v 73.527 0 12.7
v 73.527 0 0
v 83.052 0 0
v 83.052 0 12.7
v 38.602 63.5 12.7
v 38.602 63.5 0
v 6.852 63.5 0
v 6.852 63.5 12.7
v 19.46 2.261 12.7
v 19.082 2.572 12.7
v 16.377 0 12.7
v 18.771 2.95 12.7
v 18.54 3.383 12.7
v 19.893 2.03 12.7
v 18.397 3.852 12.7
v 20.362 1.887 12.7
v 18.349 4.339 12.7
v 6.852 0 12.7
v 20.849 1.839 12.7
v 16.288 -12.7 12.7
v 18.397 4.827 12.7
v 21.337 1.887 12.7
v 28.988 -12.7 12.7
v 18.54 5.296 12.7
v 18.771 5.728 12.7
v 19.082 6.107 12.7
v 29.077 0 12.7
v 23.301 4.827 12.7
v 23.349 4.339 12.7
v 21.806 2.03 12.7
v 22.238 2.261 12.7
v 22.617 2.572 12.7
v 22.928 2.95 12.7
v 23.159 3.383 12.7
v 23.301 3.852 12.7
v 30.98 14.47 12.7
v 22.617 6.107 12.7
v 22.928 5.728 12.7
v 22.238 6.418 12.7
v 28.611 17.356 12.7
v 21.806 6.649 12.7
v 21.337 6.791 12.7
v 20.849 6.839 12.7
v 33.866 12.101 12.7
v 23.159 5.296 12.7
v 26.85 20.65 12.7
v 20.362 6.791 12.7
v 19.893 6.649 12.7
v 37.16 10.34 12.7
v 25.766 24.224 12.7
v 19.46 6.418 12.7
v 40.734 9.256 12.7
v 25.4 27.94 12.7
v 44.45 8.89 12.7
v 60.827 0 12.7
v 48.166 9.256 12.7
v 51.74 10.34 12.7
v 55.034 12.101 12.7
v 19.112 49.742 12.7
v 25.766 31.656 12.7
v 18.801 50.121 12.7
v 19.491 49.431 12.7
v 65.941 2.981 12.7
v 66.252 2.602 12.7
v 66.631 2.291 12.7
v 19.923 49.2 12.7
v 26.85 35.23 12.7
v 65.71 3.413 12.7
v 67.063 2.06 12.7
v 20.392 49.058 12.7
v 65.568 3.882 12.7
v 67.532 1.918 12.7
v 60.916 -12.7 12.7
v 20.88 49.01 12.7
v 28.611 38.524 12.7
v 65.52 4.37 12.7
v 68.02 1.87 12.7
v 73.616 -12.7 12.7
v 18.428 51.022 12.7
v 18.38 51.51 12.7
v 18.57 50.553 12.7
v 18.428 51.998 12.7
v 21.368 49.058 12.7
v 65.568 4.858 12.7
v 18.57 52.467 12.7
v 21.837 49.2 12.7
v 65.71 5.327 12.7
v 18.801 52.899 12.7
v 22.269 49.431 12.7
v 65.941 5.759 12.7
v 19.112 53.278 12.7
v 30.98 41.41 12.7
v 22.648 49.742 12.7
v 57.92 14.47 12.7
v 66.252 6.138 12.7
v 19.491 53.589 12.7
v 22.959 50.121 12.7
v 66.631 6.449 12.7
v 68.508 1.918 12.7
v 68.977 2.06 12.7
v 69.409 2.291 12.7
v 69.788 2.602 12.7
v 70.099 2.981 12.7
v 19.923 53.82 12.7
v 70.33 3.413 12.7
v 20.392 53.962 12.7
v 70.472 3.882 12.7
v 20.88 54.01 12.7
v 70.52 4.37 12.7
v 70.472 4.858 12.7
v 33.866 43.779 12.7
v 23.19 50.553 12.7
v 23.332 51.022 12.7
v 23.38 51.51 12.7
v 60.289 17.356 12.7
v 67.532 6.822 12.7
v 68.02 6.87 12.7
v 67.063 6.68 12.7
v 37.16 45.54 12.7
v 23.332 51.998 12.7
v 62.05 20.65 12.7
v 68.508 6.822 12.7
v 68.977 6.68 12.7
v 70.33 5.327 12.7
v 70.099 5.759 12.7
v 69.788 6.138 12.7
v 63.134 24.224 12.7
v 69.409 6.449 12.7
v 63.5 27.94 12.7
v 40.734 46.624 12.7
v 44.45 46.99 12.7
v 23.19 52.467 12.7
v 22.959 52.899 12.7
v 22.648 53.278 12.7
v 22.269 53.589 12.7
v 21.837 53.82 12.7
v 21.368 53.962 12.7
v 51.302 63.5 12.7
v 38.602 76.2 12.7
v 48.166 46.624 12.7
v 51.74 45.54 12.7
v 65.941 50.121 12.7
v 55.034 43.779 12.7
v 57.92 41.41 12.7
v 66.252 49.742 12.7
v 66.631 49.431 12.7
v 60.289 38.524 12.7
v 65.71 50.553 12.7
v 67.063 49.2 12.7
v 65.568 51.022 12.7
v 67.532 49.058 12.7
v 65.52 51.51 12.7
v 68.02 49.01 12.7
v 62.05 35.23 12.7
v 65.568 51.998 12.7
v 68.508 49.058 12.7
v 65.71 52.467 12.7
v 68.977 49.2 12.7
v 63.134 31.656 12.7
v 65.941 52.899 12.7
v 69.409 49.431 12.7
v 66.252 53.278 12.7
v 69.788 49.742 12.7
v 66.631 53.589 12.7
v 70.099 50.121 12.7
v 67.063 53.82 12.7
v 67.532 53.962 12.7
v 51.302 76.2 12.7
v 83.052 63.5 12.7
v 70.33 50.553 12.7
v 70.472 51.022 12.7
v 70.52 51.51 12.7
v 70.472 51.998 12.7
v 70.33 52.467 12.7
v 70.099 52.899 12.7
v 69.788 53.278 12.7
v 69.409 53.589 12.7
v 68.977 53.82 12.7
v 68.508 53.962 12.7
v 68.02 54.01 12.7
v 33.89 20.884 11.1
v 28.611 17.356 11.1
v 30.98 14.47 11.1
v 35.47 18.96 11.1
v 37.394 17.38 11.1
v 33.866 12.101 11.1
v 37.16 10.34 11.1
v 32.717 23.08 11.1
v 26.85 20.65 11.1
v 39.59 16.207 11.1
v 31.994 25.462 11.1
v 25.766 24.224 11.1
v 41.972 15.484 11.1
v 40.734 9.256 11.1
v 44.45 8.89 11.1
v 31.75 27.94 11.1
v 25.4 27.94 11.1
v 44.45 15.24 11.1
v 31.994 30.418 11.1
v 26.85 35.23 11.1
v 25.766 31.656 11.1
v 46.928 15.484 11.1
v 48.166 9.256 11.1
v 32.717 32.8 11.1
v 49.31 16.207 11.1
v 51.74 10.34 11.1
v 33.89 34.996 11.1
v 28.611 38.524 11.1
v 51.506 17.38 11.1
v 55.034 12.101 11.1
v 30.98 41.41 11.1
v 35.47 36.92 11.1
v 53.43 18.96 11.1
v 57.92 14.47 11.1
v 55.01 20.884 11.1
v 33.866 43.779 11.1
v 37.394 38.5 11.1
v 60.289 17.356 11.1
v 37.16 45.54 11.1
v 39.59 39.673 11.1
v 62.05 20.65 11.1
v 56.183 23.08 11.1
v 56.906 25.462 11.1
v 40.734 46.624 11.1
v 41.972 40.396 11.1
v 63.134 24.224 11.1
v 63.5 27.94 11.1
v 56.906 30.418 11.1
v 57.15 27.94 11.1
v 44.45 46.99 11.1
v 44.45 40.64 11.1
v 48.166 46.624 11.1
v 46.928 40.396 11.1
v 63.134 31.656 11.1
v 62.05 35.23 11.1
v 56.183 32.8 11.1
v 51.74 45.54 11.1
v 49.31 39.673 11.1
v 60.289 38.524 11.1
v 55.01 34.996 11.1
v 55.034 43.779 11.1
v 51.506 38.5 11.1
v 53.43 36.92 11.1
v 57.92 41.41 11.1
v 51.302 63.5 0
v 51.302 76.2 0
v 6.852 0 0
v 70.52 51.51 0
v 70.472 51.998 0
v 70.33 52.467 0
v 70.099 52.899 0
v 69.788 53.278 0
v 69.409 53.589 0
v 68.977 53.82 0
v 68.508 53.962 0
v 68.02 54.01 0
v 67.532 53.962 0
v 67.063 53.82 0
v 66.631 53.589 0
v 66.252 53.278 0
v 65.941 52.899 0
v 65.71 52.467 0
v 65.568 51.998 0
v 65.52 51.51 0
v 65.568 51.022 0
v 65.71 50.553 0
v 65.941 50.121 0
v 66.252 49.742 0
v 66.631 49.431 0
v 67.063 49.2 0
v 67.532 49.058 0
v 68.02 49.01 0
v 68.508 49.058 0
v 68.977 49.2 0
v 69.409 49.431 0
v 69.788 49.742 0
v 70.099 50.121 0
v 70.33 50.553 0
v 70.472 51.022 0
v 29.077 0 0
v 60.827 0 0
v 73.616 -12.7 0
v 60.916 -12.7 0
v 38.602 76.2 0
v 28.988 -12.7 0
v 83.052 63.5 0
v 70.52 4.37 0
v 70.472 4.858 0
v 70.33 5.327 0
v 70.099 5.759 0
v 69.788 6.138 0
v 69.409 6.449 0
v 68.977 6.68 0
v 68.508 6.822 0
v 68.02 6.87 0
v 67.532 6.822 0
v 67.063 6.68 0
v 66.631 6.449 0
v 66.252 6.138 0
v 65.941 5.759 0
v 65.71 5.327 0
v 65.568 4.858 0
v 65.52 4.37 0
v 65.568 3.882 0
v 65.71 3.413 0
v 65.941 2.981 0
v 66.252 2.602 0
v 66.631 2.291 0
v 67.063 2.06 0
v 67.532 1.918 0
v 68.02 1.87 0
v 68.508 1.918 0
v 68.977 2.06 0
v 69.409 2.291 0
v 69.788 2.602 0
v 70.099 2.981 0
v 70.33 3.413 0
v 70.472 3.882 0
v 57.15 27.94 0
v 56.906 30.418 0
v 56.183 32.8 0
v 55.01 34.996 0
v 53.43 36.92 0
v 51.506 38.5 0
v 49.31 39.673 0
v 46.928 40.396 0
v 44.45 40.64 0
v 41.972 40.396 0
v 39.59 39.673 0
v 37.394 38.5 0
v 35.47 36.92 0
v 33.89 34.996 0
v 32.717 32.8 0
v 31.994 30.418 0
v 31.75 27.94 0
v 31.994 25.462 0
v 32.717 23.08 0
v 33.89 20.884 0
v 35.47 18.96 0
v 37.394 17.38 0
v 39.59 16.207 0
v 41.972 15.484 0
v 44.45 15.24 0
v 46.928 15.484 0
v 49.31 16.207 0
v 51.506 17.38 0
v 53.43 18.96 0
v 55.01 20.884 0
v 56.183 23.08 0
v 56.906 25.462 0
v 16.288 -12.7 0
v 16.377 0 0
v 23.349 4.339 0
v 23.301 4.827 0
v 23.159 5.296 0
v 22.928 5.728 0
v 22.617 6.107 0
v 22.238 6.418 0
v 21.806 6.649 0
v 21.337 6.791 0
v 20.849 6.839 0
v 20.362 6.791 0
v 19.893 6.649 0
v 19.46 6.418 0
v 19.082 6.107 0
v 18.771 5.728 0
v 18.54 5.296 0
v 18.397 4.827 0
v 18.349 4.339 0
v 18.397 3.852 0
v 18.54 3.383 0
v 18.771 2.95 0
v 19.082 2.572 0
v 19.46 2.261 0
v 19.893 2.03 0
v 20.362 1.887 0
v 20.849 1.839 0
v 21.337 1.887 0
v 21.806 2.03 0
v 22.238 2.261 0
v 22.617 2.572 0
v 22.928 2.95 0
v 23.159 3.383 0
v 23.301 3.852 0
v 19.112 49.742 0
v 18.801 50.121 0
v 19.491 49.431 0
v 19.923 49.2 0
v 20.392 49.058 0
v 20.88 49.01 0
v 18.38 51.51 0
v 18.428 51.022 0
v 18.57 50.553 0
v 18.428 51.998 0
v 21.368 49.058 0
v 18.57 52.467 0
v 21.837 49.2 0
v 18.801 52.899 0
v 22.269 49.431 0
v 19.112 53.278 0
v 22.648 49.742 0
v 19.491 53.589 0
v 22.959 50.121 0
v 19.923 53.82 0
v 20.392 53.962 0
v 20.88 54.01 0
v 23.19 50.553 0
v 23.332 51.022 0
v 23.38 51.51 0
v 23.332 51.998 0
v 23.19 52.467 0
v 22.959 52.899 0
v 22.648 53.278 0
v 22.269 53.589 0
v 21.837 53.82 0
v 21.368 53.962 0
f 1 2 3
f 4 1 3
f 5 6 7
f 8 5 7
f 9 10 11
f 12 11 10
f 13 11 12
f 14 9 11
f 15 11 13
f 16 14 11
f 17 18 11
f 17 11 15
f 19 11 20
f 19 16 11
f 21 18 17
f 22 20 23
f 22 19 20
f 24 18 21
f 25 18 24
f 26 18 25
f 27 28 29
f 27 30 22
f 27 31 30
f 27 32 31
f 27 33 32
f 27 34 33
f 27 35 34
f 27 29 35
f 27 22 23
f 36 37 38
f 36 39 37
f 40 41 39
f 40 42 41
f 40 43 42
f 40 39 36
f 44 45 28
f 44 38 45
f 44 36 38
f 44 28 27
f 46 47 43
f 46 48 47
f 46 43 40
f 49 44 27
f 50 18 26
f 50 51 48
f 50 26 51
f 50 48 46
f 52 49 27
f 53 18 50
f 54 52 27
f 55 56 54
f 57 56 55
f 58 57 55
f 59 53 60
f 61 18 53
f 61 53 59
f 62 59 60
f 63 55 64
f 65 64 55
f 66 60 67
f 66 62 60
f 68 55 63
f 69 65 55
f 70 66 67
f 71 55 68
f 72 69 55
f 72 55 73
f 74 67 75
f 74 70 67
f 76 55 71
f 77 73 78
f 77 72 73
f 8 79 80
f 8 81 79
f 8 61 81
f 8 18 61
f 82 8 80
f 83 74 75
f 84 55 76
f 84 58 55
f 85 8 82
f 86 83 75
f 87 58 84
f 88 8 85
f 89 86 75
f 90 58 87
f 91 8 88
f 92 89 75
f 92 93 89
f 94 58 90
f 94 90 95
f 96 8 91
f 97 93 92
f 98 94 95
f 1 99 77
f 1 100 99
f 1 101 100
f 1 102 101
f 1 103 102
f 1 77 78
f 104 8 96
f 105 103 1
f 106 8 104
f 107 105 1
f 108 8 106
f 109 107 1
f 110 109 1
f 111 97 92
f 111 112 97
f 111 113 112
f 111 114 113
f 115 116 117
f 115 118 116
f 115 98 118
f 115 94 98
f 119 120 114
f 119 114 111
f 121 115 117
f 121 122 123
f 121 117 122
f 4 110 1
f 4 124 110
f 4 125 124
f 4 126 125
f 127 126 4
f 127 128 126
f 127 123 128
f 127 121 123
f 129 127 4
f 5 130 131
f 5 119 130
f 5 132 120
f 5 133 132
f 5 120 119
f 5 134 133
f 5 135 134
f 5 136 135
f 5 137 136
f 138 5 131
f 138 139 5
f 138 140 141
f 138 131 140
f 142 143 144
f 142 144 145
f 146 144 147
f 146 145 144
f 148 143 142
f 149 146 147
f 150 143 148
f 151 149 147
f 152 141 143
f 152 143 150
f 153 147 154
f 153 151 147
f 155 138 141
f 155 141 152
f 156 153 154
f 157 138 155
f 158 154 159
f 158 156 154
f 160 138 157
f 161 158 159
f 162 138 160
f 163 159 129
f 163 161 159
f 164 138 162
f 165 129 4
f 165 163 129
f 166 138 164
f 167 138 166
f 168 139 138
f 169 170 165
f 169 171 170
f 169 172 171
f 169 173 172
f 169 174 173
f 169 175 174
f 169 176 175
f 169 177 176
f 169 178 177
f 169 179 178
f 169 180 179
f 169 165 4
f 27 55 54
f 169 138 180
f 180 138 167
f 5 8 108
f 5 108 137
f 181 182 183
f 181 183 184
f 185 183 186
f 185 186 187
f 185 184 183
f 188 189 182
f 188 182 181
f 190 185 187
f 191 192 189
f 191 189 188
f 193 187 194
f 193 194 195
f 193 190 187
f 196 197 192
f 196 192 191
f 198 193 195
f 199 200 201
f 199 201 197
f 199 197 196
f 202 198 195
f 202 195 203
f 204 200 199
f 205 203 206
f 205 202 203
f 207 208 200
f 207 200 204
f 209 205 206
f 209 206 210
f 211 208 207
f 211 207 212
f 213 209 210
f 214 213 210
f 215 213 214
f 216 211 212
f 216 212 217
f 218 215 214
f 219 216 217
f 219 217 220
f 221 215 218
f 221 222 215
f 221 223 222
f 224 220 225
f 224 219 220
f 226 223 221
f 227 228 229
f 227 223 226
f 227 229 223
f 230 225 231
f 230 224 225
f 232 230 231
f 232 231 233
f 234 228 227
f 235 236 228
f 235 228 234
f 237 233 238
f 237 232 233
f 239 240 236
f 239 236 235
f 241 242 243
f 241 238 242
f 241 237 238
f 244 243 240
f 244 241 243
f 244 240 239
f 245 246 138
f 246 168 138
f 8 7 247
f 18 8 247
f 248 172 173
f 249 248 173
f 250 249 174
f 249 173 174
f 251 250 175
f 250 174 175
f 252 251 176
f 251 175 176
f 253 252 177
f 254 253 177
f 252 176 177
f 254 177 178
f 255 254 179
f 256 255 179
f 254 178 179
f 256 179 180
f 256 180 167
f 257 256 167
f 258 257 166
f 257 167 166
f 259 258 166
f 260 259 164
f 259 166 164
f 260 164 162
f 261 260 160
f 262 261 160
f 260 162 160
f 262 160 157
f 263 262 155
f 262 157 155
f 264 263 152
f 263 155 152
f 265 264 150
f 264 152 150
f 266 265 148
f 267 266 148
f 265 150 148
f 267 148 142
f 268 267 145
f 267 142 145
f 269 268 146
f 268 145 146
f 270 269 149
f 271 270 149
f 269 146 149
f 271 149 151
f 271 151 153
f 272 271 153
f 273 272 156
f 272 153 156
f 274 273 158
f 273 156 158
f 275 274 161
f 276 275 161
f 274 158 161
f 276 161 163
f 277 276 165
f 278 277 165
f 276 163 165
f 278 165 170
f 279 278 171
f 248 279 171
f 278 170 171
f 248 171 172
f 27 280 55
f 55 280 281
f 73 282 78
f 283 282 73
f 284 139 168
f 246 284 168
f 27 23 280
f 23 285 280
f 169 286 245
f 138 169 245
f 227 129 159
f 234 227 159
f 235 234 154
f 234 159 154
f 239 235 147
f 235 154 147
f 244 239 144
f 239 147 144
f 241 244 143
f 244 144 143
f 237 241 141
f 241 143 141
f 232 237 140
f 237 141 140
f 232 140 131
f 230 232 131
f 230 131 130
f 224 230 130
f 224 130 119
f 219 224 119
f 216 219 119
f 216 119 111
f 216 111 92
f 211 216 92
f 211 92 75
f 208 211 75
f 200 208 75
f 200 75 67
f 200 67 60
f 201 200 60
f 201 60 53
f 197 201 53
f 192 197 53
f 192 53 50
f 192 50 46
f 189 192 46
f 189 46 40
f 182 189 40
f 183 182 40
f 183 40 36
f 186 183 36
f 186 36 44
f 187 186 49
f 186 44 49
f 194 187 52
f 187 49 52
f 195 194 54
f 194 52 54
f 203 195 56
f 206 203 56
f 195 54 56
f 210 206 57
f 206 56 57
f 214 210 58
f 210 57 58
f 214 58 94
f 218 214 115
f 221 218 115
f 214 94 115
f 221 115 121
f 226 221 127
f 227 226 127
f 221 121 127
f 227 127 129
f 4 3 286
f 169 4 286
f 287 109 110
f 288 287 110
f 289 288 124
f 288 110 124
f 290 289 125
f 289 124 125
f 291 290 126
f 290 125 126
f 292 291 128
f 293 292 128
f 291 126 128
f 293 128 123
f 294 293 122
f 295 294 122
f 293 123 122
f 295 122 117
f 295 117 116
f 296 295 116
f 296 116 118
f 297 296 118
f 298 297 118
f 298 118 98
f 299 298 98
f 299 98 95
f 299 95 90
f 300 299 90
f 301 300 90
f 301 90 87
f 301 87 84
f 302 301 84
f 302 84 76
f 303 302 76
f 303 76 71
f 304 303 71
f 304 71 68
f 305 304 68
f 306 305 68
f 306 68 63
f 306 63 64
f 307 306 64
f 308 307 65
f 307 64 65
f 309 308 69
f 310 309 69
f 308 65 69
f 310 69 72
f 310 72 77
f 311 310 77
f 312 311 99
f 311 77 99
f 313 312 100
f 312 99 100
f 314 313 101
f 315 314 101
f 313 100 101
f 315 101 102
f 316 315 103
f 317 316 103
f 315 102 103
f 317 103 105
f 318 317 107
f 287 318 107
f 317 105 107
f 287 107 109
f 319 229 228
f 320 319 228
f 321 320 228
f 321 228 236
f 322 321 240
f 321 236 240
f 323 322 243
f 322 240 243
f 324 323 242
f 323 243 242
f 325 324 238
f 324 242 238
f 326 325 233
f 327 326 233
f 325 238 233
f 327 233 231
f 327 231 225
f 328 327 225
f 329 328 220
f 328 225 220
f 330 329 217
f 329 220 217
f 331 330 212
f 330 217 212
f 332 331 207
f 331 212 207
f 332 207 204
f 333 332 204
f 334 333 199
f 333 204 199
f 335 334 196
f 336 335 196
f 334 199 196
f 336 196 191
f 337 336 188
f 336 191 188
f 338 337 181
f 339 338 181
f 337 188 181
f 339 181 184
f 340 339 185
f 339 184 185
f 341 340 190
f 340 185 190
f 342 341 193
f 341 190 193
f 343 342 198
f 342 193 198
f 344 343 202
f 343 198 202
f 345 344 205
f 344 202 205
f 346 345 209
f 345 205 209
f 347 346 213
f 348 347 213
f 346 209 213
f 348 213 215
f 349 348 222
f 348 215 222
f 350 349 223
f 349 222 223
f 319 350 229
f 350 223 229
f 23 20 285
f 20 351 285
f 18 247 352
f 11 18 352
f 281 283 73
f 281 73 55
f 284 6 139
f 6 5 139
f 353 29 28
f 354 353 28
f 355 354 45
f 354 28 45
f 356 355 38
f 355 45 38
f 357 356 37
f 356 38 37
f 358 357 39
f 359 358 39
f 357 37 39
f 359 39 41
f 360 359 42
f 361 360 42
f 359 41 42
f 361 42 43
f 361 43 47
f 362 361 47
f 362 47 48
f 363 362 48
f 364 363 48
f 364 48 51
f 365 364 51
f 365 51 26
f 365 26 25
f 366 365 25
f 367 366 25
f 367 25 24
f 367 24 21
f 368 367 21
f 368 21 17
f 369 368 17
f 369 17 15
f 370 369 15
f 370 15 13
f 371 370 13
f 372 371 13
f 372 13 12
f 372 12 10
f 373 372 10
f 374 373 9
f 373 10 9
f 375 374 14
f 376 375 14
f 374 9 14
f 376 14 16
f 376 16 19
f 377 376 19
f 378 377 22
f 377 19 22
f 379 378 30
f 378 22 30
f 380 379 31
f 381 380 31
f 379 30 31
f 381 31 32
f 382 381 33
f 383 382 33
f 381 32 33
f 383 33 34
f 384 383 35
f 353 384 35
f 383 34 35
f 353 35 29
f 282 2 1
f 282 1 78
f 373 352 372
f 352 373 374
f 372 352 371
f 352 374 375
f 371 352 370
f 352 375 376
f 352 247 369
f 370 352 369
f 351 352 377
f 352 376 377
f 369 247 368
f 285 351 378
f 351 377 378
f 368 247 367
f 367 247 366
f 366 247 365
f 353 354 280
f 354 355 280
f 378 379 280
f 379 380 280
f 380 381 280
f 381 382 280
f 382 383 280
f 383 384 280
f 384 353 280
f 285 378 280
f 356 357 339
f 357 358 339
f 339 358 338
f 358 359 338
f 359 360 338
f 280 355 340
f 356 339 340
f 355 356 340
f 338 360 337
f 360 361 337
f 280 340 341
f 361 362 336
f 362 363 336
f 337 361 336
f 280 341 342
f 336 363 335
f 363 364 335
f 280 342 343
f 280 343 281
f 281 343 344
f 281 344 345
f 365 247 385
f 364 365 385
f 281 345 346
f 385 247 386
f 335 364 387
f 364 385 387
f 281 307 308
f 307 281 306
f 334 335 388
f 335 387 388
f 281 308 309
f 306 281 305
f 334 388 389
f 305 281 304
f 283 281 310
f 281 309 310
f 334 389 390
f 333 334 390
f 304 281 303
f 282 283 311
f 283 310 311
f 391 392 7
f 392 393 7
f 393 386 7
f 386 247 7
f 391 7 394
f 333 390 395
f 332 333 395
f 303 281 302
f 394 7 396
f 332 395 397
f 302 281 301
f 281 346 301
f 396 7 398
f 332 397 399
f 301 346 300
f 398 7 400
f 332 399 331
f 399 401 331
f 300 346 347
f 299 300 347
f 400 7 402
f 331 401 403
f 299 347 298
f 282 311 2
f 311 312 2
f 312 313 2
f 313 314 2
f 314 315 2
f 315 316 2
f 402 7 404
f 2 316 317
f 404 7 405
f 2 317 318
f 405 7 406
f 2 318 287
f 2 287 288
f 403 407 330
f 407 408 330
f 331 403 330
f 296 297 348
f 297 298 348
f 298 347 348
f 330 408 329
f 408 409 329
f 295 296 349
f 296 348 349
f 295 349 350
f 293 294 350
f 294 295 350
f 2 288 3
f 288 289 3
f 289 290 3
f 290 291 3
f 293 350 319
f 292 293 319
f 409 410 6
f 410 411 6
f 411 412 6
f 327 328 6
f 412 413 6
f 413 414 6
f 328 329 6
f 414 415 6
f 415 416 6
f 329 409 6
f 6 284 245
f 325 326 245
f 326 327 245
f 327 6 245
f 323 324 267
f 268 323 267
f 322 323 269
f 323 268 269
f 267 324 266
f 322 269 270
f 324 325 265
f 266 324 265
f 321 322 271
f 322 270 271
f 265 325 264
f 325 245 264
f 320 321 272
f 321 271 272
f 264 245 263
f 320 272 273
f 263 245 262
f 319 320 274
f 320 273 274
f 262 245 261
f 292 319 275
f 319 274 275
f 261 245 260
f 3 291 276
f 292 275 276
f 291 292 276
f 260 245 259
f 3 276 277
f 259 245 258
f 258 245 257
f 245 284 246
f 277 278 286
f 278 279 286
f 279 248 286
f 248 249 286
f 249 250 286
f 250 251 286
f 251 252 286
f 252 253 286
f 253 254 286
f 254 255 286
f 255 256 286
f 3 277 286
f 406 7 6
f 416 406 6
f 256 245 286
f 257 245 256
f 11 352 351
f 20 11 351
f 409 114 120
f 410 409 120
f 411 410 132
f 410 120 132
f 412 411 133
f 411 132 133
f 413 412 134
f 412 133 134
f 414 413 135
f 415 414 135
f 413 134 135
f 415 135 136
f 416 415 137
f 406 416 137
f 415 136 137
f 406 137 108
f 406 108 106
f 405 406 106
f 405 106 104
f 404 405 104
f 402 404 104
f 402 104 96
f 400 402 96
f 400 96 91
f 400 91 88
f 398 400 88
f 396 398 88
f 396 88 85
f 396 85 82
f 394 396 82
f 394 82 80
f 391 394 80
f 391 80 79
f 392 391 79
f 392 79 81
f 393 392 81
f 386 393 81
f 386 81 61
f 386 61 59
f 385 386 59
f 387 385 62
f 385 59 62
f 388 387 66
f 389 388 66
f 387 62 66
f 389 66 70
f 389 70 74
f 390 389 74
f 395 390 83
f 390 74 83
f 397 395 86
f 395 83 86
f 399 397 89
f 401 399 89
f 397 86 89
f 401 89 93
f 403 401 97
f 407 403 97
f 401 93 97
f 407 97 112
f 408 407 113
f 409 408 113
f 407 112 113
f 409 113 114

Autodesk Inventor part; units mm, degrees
ref_plane "YZ Plane" through (0, 0, 0) normal (1, 0, 0) x (0, 1, 0)
ref_plane "XZ Plane" through (0, 0, 0) normal (0, 1, 0) x (-1, 0, 0)
ref_plane "XY Plane" through (0, 0, 0) normal (0, 0, 1) x (1, 0, 0)
sketch "Sketch1" plane through (0, 0, 0) normal (0, 0, 1) x (1, 0, 0)
  line L0 (6.8523, -0.0001) -> (16.3773, -0.0001)
  line L1 (83.0523, -0.0001) -> (83.0523, 63.4999)
  line L2 (83.0523, 63.4999) -> (6.8523, 63.4999)
  line L3 (6.8523, 63.4999) -> (6.8523, -0.0001)
  line L4 (44.9523, 0) -> (60.8273, 0) construction
  line L5 (44.9523, 0) -> (60.8273, 0) construction
  line L6 (73.5273, -0.0001) -> (73.6164, -12.6997)
  line L7 (73.6164, -12.6997) -> (60.9164, -12.7)
  line L8 (60.9164, -12.7) -> (60.8273, 0)
  line L9 (73.5273, -0.0001) -> (83.0523, -0.0001)
  line L10 (44.9523, 0) -> (44.9523, 63.4999) construction
  line L11 (44.9523, 0) -> (29.0773, 0) construction
  line L12 (44.9523, 0) -> (29.0773, 0) construction
  line L13 (16.3773, -0.0001) -> (16.2881, -12.6997)
  line L14 (16.2881, -12.6997) -> (28.9881, -12.7)
  line L15 (28.9881, -12.7) -> (29.0773, 0)
  line L16 (29.0773, 0) -> (60.8273, 0)
  dimension "d10" = 76.2
  dimension "d11" = 63.5
  dimension "d12" = 15.875
  dimension "d13" = 0
  dimension "d14" = 12.7
  dimension "d15" = 12.7
extrude "Extrusion1" add sketch "Sketch1" along normal blind 12.7
sketch "Sketch2" plane through (0, 0, 12.7) normal (0, 0, 1) x (1, 0, 0)
  line L0 (72.65, -0.26) -> (16.25, -0.26) construction
  line L1 (16.25, -0.26) -> (16.25, 56.14) construction
  line L2 (16.25, 56.14) -> (72.65, 56.14) construction
  line L3 (72.65, 56.14) -> (72.65, -0.26) construction
  line L4 (16.25, -0.26) -> (72.65, 56.14) construction
  line L5 (68.02, 4.37) -> (20.88, 4.37) construction
  line L6 (20.88, 4.37) -> (20.88, 51.51) construction
  line L7 (20.88, 51.51) -> (68.02, 51.51) construction
  line L8 (68.02, 51.51) -> (68.02, 4.37) construction
  line L9 (68.02, 4.37) -> (20.88, 51.51) construction
  line L10 (20.88, 4.37) -> (68.02, 51.51) construction
  circle A0 centre (20.8494, 4.3394) radius 2.5
  circle A1 centre (20.88, 51.51) radius 2.5
  circle A2 centre (68.02, 51.51) radius 2.5
  circle A3 centre (68.02, 4.37) radius 2.5
  line L11 (29.0773, 0) -> (60.8273, 0) construction
  line L12 (44.9523, 0) -> (44.9523, 27.94) construction
  line L13 (44.9523, 0) -> (72.8923, 0) construction
  point P0 (0, 0)
  point P1 (44.45, 27.94)
  dimension "d18" = 47.14
  dimension "d19" = 47.14
  dimension "d20" = 5
  dimension "d21" = 5
  dimension "d22" = 5
  dimension "d23" = 5
  dimension "d24" = 27.94
  dimension "d25" = 90
extrude "Extrusion2" cut sketch "Sketch2" against normal through all
sketch "Sketch3" plane through (0, 0, 12.7) normal (0, 0, 1) x (1, 0, 0)
  circle A0 centre (44.45, 27.94) radius 19.05
  line L0 (29.0773, 0) -> (60.8273, 0) construction
  line L1 (44.9523, 0) -> (44.9523, 27.94) construction
  point P0 (0, 0)
  dimension "d28" = 38.1
  dimension "d29" = 27.94
extrude "Extrusion3" cut sketch "Sketch3" against normal blind 1.6
sketch "Sketch4" plane through (44.45, 27.94, 11.1) normal (0, 0, 1) x (1, 0, 0)
  circle A0 centre (0, 0) radius 12.7
  point P0 (-44.45, -27.94)
  dimension "d32" = 25.4
extrude "Extrusion4" cut sketch "Sketch4" against normal through all
sketch "Sketch5" plane through (0, 0, 12.7) normal (0, 0, 1) x (1, 0, 0)
  line L0 (29.0773, 0) -> (60.8273, 0) construction
  line L1 (44.9523, 0) -> (44.9523, 63.4999) construction
  line L2 (83.0523, 63.4999) -> (6.8523, 63.4999) construction
  line L3 (44.9523, 63.4999) -> (44.9523, 69.8499) construction
  line L4 (44.9523, 63.4999) -> (51.3023, 63.4999) construction
  line L5 (38.6023, 76.1999) -> (51.3023, 76.1999)
  line L6 (51.3023, 76.1999) -> (51.3023, 63.4999)
  line L7 (51.3023, 63.4999) -> (38.6023, 63.4999)
  line L8 (38.6023, 63.4999) -> (38.6023, 76.1999)
  line L9 (38.6023, 76.1999) -> (51.3023, 63.4999) construction
  line L10 (51.3023, 76.1999) -> (38.6023, 63.4999) construction
  point P0 (0, 0)
  dimension "d35" = 6.35
  dimension "d36" = 90
  dimension "d37" = 12.7
  dimension "d38" = 12.7
extrude "Extrusion5" add sketch "Sketch5" against normal blind 12.7
properties part number "Motor Bracket" material "PVC-Piping"
